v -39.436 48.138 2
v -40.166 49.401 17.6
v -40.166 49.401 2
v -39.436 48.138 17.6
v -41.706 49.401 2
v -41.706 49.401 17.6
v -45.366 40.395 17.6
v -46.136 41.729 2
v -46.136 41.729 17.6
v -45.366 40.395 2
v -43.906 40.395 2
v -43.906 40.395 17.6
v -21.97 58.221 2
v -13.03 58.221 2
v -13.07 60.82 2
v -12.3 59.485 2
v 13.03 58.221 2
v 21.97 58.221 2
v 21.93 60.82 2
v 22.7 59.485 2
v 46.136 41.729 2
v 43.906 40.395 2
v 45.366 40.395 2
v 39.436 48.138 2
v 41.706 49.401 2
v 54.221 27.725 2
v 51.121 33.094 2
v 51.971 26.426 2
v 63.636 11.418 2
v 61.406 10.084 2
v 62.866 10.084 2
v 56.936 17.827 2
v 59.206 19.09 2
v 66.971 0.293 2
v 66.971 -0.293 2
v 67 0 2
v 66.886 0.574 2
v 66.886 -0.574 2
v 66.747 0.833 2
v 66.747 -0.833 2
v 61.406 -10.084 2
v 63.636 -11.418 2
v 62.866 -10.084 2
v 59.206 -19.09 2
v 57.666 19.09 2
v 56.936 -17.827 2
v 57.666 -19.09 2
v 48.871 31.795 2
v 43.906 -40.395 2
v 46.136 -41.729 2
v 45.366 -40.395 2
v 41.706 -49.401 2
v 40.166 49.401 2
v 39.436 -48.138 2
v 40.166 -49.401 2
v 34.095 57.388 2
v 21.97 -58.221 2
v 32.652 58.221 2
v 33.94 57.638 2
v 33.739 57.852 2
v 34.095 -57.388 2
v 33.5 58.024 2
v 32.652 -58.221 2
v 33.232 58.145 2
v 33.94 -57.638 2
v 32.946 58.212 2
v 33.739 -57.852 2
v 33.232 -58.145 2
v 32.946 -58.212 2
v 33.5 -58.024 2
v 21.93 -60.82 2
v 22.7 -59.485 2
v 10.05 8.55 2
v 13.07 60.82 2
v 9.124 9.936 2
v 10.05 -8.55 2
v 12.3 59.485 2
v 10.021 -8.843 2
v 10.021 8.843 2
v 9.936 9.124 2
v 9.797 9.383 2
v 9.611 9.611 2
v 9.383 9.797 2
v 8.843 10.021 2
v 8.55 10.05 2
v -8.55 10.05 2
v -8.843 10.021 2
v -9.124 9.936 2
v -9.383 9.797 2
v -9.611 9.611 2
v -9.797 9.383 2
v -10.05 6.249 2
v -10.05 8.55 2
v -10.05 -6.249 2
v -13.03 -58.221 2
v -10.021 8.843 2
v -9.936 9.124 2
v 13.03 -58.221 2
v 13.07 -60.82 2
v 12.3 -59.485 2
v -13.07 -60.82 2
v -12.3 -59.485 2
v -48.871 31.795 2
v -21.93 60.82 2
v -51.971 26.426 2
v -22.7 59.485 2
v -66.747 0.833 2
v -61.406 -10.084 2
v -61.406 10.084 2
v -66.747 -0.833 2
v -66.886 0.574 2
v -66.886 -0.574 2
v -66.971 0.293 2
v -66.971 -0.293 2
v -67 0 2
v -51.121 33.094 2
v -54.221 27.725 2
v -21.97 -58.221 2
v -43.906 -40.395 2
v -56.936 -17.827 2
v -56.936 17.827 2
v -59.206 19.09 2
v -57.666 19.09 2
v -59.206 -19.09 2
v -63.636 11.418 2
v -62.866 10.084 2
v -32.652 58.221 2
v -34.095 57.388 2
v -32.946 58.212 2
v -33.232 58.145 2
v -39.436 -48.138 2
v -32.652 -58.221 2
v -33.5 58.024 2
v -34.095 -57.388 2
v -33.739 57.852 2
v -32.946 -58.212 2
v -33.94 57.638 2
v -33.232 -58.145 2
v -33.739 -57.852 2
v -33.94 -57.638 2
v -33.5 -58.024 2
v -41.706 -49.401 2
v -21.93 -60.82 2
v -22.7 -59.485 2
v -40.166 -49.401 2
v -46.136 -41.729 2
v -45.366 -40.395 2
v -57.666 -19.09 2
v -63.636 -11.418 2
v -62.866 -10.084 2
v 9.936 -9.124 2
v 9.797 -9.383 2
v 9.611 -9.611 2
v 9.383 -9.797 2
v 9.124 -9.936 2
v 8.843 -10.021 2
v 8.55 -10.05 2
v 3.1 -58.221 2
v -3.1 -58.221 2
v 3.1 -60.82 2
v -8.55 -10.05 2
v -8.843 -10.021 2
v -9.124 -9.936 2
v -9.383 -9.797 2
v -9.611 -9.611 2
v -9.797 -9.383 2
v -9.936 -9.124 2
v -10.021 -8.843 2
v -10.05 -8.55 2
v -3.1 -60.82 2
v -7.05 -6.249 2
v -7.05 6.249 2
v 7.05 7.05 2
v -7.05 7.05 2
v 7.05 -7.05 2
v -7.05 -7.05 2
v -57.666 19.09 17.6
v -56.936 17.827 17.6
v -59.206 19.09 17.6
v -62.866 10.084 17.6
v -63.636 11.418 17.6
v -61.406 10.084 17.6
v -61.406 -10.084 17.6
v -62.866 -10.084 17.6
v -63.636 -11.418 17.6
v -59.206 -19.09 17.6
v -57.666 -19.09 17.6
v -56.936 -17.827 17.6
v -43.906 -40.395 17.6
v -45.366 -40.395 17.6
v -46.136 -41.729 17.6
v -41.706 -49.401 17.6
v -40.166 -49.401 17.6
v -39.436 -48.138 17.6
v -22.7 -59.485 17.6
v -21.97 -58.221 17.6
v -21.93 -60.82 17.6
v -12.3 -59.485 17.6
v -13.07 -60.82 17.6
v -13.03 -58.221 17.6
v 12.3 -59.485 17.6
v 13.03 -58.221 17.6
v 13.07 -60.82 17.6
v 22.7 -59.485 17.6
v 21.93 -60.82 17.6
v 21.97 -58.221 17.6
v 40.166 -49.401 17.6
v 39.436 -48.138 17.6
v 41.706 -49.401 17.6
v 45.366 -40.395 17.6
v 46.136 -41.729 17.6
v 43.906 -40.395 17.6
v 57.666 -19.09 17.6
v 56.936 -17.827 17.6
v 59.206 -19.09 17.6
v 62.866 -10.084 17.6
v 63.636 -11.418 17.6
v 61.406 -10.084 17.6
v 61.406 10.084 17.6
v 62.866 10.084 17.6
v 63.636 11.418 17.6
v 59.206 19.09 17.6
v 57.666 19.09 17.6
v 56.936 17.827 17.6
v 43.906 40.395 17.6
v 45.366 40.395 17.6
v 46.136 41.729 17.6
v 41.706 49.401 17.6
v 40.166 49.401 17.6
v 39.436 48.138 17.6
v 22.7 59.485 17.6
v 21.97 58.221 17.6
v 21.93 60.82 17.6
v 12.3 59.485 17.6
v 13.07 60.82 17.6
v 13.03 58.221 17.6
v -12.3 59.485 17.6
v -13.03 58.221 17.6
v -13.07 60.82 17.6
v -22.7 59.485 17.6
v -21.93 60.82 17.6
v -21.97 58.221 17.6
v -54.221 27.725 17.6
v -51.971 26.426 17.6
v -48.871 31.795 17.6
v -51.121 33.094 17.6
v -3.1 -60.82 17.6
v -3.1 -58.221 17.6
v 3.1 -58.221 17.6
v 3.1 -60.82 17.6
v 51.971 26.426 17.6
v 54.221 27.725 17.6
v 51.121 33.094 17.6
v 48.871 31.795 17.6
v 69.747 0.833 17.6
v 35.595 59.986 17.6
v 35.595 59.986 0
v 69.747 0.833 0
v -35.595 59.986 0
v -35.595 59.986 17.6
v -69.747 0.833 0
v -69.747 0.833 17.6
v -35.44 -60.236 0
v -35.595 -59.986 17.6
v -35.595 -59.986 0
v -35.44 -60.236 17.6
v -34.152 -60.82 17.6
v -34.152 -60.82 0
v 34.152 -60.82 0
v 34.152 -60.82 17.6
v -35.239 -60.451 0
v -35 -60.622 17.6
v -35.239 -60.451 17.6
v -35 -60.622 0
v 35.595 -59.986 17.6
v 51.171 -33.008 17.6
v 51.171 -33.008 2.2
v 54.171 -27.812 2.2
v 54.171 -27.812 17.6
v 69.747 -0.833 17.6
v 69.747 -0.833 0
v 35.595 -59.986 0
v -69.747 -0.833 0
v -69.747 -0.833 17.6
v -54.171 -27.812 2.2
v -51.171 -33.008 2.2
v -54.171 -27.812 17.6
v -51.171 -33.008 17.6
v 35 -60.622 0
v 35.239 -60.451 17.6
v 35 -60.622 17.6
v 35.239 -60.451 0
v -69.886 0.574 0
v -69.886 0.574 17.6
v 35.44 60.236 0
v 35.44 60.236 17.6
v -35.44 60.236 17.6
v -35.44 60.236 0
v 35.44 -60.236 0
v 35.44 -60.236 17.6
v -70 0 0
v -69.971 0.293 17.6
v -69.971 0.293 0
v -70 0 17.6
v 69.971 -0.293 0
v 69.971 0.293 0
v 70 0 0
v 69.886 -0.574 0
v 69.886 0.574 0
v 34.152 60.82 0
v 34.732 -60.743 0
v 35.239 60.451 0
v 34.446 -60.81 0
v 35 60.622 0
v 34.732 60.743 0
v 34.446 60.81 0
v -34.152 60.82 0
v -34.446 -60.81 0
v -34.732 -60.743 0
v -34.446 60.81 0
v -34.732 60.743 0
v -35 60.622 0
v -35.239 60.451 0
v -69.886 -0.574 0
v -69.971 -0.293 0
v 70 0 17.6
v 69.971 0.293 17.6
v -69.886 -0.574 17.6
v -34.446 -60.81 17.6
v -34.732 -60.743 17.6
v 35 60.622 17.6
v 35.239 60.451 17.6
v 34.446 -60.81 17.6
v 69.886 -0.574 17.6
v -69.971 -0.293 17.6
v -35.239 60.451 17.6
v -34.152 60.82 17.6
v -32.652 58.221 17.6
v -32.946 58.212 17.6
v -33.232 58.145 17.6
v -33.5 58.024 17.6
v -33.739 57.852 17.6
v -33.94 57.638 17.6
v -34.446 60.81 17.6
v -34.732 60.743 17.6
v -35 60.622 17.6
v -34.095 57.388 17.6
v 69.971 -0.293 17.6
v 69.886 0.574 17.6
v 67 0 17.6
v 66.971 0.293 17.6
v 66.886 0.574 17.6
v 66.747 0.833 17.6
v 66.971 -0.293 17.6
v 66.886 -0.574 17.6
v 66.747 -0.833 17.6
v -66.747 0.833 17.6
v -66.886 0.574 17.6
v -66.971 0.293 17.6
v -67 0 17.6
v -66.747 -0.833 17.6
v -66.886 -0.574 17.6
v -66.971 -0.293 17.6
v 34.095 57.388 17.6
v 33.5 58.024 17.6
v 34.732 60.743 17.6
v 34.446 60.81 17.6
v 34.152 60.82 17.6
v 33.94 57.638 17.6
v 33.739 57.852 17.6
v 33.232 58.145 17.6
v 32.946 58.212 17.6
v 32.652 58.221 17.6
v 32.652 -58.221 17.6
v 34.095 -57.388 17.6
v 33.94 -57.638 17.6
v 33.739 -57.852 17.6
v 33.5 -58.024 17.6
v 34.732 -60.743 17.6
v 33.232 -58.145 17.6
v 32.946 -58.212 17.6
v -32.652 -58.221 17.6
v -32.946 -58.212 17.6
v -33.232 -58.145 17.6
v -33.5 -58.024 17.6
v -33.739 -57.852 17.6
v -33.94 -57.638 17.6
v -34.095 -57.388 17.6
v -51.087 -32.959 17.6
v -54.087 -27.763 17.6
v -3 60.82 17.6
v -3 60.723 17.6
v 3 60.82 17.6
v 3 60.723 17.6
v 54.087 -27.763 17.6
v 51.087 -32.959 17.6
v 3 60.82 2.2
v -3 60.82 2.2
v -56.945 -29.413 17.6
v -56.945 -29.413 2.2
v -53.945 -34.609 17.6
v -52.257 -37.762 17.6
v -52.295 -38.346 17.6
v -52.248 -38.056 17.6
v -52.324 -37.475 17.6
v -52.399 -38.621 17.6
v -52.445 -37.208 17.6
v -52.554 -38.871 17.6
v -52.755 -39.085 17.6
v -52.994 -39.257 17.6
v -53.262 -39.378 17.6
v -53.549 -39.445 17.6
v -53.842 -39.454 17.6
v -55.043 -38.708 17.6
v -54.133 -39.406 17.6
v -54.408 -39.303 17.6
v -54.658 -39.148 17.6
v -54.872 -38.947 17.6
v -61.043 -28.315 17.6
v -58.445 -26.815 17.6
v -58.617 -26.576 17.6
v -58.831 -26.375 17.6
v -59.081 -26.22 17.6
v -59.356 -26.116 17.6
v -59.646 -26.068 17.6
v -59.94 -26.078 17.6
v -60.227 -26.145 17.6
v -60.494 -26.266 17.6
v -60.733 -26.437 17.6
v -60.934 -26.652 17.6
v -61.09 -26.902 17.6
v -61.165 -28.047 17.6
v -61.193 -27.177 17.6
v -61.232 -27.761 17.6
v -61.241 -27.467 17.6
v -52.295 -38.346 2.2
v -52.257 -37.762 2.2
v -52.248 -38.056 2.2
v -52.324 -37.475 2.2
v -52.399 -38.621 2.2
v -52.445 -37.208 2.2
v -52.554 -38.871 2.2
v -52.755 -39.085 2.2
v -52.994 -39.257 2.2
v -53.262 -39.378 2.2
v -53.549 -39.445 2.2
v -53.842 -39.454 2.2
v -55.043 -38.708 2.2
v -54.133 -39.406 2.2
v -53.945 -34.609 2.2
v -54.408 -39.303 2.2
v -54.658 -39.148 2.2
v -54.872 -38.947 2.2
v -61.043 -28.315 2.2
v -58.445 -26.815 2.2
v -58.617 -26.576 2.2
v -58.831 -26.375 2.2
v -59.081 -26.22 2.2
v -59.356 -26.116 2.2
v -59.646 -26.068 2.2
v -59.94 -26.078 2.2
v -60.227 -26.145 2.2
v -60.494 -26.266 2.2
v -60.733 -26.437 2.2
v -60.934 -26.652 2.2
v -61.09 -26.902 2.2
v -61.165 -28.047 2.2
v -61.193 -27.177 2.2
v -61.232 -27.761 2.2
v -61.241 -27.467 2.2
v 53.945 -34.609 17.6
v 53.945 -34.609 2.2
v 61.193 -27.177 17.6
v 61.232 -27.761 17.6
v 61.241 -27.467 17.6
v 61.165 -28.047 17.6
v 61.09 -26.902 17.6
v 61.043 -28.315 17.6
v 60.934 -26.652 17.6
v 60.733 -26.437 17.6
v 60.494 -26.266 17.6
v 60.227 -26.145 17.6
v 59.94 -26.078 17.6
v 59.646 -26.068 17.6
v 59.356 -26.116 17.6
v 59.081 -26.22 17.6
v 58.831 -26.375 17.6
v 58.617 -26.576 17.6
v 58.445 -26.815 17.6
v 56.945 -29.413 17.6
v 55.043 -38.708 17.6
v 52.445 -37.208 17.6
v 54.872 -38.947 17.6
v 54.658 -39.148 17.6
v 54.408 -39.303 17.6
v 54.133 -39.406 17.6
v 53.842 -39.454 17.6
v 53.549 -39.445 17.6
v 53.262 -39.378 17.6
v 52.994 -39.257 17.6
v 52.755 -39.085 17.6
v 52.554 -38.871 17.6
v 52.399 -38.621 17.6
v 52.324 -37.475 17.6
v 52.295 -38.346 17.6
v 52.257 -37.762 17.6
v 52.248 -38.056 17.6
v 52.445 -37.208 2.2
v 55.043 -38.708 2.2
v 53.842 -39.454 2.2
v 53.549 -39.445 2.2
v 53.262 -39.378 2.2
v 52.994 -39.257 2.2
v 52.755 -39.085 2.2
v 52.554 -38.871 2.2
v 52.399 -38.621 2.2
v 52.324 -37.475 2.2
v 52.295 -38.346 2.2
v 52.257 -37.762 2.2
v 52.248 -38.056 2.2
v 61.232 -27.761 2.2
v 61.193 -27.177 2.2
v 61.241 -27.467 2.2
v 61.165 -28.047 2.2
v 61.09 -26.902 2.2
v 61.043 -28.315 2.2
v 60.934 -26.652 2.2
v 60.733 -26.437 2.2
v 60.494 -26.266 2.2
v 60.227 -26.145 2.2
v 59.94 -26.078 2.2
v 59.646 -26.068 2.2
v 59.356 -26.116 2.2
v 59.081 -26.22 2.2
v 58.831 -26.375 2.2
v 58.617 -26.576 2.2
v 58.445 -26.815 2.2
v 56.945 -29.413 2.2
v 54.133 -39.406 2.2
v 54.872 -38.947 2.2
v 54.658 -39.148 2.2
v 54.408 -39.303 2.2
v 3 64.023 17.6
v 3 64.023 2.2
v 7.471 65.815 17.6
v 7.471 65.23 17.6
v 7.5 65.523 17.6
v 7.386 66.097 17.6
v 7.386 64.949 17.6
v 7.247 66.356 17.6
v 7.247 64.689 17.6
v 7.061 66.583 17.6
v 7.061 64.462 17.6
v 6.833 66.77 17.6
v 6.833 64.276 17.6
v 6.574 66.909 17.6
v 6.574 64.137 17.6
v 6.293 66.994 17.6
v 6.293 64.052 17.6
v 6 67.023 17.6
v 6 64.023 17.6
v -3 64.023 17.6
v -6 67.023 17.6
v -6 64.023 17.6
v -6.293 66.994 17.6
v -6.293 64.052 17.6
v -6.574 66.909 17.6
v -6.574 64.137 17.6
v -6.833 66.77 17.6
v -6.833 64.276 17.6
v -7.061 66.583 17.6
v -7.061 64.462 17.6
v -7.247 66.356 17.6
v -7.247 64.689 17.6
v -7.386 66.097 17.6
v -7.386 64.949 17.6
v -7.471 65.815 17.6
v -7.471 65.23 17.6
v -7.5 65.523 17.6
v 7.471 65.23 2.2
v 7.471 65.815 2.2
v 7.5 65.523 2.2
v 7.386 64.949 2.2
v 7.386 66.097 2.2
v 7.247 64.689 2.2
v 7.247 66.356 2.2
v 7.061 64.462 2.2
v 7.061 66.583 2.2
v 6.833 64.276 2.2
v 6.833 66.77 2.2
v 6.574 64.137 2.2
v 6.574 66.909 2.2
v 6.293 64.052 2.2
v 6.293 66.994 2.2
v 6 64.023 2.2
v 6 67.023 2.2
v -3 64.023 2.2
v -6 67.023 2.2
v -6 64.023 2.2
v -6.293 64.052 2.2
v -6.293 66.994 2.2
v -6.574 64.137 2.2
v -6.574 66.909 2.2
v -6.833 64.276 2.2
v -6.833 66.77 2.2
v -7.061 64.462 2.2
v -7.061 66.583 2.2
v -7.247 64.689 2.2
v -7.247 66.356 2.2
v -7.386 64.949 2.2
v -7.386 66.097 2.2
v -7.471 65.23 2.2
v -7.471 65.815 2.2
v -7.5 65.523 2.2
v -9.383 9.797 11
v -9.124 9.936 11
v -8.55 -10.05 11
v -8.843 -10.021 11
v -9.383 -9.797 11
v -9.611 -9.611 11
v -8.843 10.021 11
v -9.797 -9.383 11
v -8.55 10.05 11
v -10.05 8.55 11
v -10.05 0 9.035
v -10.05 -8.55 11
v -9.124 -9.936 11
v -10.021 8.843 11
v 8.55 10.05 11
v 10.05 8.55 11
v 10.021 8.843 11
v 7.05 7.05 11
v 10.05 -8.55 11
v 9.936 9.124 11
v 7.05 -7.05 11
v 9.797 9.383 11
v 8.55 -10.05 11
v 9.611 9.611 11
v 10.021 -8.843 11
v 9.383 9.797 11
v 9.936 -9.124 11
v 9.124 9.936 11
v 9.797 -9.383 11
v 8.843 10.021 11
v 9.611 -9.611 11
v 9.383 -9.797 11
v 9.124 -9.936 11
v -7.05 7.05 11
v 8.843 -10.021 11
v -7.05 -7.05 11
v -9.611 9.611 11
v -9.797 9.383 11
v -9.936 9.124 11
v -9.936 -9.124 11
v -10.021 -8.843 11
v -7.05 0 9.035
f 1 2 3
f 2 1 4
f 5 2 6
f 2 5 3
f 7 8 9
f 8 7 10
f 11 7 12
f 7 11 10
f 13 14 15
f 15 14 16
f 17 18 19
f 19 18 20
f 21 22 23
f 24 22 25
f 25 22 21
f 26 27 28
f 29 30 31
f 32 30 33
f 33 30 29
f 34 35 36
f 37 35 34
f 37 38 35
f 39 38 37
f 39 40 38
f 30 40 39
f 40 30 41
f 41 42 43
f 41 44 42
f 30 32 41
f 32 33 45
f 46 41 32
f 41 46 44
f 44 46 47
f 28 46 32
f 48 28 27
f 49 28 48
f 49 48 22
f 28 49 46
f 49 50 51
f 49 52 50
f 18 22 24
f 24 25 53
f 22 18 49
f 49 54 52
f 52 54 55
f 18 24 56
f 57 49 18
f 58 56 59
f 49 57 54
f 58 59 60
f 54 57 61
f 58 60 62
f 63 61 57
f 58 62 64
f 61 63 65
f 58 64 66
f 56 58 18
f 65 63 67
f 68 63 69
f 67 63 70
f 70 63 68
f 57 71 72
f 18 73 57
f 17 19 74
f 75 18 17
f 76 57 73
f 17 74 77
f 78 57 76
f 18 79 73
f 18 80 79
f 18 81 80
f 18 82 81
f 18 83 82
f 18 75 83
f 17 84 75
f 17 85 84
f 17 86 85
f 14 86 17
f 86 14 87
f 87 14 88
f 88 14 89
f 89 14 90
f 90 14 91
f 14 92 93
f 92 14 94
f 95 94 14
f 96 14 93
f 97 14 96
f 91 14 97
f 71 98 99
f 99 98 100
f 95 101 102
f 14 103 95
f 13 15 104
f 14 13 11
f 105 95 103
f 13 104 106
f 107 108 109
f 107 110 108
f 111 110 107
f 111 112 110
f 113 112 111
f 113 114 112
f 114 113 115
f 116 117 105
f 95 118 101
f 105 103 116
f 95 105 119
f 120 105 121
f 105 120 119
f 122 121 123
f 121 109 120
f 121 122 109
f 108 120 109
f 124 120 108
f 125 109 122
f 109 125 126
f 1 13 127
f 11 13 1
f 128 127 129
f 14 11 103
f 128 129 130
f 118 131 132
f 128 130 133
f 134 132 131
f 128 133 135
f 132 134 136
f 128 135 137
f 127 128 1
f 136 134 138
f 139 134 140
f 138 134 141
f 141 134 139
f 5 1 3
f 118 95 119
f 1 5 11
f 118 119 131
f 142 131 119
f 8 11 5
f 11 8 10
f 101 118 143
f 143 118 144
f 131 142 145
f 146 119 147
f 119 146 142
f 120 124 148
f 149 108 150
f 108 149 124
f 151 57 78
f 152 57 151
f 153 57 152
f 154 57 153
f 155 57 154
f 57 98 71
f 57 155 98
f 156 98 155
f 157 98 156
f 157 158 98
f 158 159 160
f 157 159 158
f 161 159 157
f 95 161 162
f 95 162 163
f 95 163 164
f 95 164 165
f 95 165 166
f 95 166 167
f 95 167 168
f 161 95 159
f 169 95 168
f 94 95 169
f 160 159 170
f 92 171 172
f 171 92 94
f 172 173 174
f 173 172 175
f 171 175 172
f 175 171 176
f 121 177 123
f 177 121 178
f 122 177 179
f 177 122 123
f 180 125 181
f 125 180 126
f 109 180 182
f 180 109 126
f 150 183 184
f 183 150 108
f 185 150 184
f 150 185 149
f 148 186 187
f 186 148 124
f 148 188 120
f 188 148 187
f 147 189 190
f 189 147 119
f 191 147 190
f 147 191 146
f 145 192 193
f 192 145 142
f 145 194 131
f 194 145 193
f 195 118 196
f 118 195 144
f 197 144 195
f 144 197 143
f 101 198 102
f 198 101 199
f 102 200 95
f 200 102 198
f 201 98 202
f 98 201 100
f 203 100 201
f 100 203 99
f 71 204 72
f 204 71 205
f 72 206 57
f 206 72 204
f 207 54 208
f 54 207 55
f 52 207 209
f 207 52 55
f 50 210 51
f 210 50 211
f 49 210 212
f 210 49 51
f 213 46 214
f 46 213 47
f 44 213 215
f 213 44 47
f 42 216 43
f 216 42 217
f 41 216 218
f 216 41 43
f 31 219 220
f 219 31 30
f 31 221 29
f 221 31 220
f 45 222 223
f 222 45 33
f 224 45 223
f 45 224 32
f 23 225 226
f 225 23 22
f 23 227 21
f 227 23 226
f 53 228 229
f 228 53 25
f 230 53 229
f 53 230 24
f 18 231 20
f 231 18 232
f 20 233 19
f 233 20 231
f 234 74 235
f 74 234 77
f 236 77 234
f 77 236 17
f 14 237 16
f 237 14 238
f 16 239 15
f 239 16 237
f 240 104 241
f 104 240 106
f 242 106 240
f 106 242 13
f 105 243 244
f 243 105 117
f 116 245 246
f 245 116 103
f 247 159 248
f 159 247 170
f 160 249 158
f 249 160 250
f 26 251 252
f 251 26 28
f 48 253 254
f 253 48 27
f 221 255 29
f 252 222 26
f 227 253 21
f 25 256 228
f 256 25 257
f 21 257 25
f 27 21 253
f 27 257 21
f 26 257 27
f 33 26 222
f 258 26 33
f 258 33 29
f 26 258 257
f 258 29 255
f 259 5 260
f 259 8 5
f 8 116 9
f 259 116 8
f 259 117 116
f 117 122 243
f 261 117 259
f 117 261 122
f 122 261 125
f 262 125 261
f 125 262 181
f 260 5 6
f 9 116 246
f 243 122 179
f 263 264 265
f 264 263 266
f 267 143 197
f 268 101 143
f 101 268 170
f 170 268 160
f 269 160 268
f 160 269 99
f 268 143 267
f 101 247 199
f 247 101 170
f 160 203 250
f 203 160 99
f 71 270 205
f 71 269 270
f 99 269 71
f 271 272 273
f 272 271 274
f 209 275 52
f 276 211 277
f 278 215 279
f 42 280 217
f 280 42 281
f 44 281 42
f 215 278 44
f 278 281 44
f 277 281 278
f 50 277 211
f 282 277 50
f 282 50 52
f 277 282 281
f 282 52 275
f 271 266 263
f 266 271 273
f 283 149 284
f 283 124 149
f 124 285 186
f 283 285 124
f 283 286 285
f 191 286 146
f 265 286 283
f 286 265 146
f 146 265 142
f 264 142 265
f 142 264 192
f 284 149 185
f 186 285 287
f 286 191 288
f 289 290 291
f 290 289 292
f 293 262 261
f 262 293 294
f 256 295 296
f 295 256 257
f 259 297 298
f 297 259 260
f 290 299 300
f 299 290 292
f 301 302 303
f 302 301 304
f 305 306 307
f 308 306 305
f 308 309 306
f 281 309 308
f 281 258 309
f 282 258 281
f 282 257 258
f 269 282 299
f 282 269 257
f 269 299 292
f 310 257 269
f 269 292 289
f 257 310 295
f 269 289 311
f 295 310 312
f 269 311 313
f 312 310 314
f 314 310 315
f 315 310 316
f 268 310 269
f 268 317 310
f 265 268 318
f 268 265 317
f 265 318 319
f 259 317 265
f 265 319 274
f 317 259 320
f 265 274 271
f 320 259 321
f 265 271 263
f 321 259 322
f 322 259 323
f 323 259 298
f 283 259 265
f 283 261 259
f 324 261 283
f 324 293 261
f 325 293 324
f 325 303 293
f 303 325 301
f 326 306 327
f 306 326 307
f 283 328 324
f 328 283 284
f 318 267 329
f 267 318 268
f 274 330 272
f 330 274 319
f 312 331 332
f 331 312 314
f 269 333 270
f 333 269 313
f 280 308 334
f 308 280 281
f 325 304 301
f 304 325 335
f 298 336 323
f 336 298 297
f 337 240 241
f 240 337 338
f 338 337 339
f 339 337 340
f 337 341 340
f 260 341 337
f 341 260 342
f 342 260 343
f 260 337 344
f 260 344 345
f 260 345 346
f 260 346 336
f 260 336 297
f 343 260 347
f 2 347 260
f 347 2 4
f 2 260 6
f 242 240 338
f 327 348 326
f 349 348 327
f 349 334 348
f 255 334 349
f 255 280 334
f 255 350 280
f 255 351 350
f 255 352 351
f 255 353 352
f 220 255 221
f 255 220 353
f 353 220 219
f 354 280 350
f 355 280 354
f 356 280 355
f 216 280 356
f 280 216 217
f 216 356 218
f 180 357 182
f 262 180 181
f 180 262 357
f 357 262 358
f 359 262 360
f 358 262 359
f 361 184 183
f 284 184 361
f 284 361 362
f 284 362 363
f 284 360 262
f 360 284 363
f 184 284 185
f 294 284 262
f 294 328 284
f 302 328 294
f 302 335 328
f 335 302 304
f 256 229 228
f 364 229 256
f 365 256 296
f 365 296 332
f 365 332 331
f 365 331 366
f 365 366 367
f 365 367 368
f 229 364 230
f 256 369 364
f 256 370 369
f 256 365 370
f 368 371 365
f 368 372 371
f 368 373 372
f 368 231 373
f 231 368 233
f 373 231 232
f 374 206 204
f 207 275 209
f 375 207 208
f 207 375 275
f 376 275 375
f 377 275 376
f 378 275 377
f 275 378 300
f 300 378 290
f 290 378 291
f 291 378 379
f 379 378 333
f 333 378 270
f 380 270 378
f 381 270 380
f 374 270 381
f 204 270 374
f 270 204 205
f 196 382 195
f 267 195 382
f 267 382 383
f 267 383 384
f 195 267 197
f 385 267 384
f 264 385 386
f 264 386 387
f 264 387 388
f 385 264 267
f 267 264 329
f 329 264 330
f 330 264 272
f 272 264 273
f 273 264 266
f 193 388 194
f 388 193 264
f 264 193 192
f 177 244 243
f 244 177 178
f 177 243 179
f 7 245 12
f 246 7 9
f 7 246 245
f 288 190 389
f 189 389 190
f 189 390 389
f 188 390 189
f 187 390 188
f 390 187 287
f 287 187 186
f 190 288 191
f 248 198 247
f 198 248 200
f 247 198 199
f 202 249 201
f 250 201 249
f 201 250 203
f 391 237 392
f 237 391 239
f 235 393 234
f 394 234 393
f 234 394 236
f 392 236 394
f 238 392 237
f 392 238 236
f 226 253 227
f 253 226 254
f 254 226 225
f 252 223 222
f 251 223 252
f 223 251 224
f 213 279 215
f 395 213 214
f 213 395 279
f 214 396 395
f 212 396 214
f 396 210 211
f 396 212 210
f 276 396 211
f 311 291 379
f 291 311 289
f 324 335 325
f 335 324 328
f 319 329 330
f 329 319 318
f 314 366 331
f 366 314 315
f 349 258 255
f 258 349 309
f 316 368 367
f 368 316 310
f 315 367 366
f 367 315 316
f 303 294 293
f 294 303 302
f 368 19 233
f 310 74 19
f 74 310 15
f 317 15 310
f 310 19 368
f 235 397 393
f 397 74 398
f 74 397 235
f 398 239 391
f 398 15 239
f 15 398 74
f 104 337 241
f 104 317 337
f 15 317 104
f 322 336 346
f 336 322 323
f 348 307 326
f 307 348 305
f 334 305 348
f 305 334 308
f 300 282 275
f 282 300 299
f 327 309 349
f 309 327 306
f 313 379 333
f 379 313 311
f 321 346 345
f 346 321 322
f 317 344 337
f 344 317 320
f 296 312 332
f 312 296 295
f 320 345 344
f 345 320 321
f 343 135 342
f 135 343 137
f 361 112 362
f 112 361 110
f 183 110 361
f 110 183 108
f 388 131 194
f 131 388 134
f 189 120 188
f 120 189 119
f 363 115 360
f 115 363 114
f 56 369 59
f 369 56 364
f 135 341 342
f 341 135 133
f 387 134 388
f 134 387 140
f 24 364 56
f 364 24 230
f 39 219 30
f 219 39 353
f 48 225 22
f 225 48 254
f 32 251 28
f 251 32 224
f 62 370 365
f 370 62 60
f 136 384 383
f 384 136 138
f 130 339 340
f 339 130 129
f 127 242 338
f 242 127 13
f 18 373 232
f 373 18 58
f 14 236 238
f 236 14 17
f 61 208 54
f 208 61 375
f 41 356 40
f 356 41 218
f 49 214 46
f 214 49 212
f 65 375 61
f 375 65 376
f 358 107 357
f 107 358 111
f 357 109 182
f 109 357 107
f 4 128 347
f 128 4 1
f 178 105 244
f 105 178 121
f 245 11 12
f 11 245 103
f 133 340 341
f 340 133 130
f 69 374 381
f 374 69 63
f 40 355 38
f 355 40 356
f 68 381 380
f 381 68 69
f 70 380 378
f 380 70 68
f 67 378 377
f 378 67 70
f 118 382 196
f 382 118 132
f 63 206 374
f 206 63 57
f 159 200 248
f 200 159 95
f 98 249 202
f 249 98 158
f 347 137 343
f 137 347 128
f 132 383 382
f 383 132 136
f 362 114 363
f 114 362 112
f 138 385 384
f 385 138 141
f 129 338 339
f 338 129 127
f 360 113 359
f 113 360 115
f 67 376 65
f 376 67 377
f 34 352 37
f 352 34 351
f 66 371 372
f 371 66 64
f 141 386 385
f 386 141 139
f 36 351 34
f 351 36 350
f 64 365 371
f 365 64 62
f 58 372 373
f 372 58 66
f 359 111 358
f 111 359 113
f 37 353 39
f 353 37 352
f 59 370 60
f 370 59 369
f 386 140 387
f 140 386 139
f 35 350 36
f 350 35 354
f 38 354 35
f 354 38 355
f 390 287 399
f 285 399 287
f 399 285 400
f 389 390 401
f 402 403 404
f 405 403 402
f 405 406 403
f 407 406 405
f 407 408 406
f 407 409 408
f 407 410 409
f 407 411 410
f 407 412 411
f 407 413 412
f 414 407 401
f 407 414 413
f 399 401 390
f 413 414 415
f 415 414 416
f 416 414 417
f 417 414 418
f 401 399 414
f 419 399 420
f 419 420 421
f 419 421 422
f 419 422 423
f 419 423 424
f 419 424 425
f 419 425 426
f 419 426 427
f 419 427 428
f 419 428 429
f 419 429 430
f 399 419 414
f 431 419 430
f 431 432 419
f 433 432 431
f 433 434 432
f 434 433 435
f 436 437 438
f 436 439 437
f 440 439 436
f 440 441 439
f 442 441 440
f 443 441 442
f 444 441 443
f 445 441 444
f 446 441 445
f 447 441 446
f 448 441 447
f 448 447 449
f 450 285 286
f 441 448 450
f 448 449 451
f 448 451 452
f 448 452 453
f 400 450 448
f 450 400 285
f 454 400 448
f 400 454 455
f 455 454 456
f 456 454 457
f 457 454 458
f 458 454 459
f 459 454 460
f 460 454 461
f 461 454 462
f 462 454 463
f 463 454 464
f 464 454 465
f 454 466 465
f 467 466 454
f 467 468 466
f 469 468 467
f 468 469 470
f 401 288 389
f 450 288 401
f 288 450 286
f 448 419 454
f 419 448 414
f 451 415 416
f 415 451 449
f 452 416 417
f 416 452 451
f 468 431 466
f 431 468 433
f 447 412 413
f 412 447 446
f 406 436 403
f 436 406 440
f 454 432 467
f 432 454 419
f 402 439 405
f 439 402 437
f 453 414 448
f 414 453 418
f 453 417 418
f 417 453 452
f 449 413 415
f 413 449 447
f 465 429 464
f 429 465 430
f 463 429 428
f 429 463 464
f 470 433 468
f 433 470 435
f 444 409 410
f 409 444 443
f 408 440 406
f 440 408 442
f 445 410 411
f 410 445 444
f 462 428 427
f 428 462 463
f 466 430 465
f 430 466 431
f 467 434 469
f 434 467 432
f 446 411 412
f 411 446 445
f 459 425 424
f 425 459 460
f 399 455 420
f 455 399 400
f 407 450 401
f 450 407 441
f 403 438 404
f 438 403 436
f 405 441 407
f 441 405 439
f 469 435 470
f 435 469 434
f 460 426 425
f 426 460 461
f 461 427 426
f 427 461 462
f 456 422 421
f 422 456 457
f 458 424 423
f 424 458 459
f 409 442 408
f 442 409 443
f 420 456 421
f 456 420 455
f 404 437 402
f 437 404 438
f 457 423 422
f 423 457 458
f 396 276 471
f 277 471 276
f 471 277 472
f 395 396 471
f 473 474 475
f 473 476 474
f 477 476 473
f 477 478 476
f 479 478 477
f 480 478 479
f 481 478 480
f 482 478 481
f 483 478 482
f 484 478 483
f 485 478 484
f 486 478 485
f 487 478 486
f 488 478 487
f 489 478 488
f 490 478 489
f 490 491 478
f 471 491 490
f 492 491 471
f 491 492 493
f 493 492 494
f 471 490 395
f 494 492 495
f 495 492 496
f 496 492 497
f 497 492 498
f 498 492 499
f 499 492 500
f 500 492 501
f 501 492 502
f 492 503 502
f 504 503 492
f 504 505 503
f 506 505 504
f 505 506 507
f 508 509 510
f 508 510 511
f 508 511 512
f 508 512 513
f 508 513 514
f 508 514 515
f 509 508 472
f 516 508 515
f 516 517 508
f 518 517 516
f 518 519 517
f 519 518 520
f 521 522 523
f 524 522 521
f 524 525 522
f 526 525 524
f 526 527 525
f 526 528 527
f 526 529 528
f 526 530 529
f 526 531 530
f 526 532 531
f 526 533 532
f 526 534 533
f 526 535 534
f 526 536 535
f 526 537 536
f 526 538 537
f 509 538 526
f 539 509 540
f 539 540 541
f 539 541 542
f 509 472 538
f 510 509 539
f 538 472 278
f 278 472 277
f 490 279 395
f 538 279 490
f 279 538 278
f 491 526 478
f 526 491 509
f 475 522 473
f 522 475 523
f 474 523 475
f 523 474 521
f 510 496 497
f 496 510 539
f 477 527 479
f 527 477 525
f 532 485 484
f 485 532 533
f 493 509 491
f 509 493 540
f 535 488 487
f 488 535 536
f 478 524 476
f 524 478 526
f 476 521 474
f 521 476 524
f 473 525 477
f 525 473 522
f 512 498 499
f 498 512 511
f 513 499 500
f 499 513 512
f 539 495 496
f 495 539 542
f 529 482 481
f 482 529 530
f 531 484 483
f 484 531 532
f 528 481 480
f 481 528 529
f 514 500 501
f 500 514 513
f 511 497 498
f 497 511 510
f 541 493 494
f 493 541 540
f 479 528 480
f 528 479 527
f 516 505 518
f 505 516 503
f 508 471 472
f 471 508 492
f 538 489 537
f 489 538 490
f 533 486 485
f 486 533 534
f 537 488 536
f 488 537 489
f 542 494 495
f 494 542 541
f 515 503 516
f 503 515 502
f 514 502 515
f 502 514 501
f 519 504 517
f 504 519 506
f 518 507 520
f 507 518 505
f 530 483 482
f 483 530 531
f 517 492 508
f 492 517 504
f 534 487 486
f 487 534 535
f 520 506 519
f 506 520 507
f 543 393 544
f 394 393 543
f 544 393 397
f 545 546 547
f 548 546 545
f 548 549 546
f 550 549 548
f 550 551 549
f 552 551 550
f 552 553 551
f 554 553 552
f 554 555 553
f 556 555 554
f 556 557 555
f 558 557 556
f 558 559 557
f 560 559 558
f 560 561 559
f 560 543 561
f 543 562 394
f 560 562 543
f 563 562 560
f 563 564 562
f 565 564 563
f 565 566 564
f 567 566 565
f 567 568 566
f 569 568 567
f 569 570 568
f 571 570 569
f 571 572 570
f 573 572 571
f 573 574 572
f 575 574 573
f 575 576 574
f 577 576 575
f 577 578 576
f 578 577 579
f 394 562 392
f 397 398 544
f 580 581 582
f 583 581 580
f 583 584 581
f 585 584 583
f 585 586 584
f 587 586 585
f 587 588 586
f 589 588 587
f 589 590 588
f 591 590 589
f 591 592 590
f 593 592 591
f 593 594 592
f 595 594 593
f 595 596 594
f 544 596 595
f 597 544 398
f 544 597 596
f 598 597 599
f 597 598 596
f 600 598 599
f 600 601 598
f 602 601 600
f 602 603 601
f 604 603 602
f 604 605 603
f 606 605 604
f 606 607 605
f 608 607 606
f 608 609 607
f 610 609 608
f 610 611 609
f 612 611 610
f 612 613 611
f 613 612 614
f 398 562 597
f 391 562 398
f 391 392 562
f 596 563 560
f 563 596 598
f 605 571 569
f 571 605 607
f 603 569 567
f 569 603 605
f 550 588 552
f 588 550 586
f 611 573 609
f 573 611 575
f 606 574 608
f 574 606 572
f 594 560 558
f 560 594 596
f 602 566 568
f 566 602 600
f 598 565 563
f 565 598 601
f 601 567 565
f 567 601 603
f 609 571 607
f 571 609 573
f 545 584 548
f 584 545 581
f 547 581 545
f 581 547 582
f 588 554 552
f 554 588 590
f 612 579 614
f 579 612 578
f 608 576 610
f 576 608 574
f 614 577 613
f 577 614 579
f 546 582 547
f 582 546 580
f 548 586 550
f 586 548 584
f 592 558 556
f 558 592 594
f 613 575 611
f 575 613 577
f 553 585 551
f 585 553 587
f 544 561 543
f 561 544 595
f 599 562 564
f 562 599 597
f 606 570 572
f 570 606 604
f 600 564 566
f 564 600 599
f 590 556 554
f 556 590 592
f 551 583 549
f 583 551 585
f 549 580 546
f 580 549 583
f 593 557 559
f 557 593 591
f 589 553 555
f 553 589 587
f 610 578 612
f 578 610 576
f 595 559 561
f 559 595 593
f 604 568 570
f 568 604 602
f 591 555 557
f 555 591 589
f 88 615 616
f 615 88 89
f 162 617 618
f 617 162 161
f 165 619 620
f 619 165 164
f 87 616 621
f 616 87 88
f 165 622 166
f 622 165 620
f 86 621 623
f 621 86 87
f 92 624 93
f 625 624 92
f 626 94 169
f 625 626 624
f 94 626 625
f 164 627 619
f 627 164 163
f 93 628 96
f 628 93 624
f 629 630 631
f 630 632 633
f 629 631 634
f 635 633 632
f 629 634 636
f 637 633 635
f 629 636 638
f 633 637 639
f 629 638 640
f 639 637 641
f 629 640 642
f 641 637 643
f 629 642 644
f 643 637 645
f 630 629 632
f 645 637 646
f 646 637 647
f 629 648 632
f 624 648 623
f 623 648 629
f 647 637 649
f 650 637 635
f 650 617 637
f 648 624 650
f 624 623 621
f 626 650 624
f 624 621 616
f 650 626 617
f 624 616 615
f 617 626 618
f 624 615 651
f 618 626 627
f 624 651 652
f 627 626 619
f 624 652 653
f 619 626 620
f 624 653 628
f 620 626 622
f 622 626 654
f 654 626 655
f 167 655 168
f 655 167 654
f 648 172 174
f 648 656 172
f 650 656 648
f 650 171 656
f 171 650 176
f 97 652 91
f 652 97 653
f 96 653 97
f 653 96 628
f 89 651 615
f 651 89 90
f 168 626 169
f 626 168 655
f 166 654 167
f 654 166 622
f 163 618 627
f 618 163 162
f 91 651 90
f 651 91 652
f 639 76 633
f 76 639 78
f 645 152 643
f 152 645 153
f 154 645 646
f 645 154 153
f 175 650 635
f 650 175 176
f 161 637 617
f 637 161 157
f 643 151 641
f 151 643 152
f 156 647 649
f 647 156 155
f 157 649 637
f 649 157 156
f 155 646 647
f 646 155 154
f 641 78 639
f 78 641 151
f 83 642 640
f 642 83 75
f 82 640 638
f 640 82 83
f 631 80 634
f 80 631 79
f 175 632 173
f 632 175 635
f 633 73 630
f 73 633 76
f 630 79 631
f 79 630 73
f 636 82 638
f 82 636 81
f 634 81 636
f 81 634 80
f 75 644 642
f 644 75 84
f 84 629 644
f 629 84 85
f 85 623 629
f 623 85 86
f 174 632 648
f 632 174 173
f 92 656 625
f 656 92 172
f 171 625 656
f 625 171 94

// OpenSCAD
$fn = 32;

radius = 70;
wall = 3;
base = 2;
top = 1;

pad_size = 10;

cherry_width = 13.9;
cherry_height = 9;
cherry_stem_width = 4.1;
cherry_stem_height = 3.6;
cherry_stem_wall = 1.17;

tol = 0.2;

module base() {
    height = cherry_height+base+6.6;
    
    difference() {
        hull() for (n = [1:6]) rotate([0, 0, (n+0)*360/6])
            translate([radius-wall/2, 0, 0]) cylinder(height, r=wall/2);
        hull() for (n = [1:6]) rotate([0, 0, (n+0)*360/6])
            translate([radius-3*wall/2, 0, base]) cylinder(height, r=wall/2);
        
        // slots for pads
        for (n = [1:6])
        rotate([0, 0, n*360/6]) translate([0, sqrt(3)*(radius-7*wall/16)/2, base]) {
            translate([radius/4, 0, 0]) cylinder(height, r=pad_size/2+tol, $fn=6);
            translate([-radius/4, 0, 0]) cylinder(height, r=pad_size/2+tol, $fn=6);
        }
        
        // slots for connectors
        for (n = [1:2:6])
        rotate([0, 0, n*360/6]) translate([0, sqrt(3)*(radius-7*wall/16)/2, base])
            translate([0, 0, height/2]) cube([2*wall+tol, 2*wall, height], true);
    }
    
    // connectors
    for (n = [1:2:6])
    rotate([0, 0, (n+1)*360/6]) translate([0, sqrt(3)*(radius-wall/2)/2, base+tol]) {
        translate([-wall, (wall-tol)/2, 0]) cube([2*wall, wall+2*tol, height-base-tol]);
        hull() {
            translate([2*wall, 2*wall+tol, 0]) cylinder(height-base-tol, r=wall/2);
            translate([-2*wall, 2*wall+tol, 0]) cylinder(height-base-tol, r=wall/2);
        }
    }
    
    // cherry mx mount
    difference() {
        for (n = [1:4]) hull() {
            rotate([0, 0, (n+0)*360/4])
            translate([(cherry_width+wall+tol)/2, (cherry_width+wall+tol)/2, base])
                cylinder(cherry_height, r=wall/2);
            rotate([0, 0, (n+1)*360/4])
            translate([(cherry_width+wall+tol)/2, (cherry_width+wall+tol)/2, base])
                cylinder(cherry_height, r=wall/2);
        }
        scale([1,2,1.3]) rotate([0,-90,0]) cylinder(cherry_width, r=cherry_width/2, $fn=3);
    }
}

module lid() {
    height = cherry_height+top+6.6;
    
    hull() for (n = [1:6]) rotate([0, 0, (n+0)*360/6])
        translate([radius-wall/2, 0, 0]) cylinder(top, r=wall/2);
    
    // corners
    difference() {
        hull() for (n = [1:6]) rotate([0, 0, (n+0)*360/6])
            translate([radius-3*wall/2-tol, 0, 0]) cylinder(height, r=wall/2);
        hull() for (n = [1:6]) rotate([0, 0, (n+0)*360/6])
            translate([radius-5*wall/2-tol, 0, top]) cylinder(height, r=wall/2);
        for (n = [1:6]) rotate([0, 0, n*360/6])
        translate([0, sqrt(3)*(radius-3*wall/2-tol)/2, height/2+top])
            cube([3*radius/4, 2*wall, height], true);
    }
    
    // cherry stem mount
    translate([0, 0, top]) difference() {
        cylinder(cherry_stem_height, r=5.5/2);
        translate([0, 0, cherry_stem_height/2])
            cube([cherry_stem_width+tol, cherry_stem_wall+tol, cherry_stem_height], true);
        translate([0, 0, cherry_stem_height/2])
            cube([cherry_stem_wall+tol, cherry_stem_width+tol, cherry_stem_height], true);
    }
}

module pad() {
    height = cherry_height+6.6;
    
    intersection() {
        cylinder(height-wall, r=pad_size/2, $fn=6);
        translate([0, 0, height/2]) cube([pad_size, wall+2*tol, height], true);
    }
}

module plug() {
    height = cherry_height+wall+6.6;
    
    difference() {
        intersection() {
            scale([1,0.5,1]) cylinder(height, r=2*radius/5);
            translate([0, wall/2-radius/2, height/2]) cube([radius,radius,height], true);
        }
        translate([0, 0, wall]) intersection() {
            scale([1,0.5-wall/radius,1]) cylinder(height, r=2*radius/5-wall);
            translate([0,-radius/2-wall/2,height/2]) cube([radius, radius, height], true);
        }
        
        // slots for pads
        translate([radius/4, 0, wall]) cylinder(height, r=pad_size/2+tol, $fn=6);
        translate([-radius/4, 0, wall]) cylinder(height, r=pad_size/2+tol, $fn=6);
    }
    
    // connector    
    translate([-wall, (wall-tol)/2, wall+tol]) cube([2*wall, wall+2*tol, height-wall-tol]);
    hull() {
        translate([2*wall, 2*wall+tol, wall+tol]) cylinder(height-wall-tol, r=wall/2);
        translate([-2*wall, 2*wall+tol, wall+tol]) cylinder(height-wall-tol, r=wall/2);
    }
}

base();
//lid();
//pad();
//plug();
